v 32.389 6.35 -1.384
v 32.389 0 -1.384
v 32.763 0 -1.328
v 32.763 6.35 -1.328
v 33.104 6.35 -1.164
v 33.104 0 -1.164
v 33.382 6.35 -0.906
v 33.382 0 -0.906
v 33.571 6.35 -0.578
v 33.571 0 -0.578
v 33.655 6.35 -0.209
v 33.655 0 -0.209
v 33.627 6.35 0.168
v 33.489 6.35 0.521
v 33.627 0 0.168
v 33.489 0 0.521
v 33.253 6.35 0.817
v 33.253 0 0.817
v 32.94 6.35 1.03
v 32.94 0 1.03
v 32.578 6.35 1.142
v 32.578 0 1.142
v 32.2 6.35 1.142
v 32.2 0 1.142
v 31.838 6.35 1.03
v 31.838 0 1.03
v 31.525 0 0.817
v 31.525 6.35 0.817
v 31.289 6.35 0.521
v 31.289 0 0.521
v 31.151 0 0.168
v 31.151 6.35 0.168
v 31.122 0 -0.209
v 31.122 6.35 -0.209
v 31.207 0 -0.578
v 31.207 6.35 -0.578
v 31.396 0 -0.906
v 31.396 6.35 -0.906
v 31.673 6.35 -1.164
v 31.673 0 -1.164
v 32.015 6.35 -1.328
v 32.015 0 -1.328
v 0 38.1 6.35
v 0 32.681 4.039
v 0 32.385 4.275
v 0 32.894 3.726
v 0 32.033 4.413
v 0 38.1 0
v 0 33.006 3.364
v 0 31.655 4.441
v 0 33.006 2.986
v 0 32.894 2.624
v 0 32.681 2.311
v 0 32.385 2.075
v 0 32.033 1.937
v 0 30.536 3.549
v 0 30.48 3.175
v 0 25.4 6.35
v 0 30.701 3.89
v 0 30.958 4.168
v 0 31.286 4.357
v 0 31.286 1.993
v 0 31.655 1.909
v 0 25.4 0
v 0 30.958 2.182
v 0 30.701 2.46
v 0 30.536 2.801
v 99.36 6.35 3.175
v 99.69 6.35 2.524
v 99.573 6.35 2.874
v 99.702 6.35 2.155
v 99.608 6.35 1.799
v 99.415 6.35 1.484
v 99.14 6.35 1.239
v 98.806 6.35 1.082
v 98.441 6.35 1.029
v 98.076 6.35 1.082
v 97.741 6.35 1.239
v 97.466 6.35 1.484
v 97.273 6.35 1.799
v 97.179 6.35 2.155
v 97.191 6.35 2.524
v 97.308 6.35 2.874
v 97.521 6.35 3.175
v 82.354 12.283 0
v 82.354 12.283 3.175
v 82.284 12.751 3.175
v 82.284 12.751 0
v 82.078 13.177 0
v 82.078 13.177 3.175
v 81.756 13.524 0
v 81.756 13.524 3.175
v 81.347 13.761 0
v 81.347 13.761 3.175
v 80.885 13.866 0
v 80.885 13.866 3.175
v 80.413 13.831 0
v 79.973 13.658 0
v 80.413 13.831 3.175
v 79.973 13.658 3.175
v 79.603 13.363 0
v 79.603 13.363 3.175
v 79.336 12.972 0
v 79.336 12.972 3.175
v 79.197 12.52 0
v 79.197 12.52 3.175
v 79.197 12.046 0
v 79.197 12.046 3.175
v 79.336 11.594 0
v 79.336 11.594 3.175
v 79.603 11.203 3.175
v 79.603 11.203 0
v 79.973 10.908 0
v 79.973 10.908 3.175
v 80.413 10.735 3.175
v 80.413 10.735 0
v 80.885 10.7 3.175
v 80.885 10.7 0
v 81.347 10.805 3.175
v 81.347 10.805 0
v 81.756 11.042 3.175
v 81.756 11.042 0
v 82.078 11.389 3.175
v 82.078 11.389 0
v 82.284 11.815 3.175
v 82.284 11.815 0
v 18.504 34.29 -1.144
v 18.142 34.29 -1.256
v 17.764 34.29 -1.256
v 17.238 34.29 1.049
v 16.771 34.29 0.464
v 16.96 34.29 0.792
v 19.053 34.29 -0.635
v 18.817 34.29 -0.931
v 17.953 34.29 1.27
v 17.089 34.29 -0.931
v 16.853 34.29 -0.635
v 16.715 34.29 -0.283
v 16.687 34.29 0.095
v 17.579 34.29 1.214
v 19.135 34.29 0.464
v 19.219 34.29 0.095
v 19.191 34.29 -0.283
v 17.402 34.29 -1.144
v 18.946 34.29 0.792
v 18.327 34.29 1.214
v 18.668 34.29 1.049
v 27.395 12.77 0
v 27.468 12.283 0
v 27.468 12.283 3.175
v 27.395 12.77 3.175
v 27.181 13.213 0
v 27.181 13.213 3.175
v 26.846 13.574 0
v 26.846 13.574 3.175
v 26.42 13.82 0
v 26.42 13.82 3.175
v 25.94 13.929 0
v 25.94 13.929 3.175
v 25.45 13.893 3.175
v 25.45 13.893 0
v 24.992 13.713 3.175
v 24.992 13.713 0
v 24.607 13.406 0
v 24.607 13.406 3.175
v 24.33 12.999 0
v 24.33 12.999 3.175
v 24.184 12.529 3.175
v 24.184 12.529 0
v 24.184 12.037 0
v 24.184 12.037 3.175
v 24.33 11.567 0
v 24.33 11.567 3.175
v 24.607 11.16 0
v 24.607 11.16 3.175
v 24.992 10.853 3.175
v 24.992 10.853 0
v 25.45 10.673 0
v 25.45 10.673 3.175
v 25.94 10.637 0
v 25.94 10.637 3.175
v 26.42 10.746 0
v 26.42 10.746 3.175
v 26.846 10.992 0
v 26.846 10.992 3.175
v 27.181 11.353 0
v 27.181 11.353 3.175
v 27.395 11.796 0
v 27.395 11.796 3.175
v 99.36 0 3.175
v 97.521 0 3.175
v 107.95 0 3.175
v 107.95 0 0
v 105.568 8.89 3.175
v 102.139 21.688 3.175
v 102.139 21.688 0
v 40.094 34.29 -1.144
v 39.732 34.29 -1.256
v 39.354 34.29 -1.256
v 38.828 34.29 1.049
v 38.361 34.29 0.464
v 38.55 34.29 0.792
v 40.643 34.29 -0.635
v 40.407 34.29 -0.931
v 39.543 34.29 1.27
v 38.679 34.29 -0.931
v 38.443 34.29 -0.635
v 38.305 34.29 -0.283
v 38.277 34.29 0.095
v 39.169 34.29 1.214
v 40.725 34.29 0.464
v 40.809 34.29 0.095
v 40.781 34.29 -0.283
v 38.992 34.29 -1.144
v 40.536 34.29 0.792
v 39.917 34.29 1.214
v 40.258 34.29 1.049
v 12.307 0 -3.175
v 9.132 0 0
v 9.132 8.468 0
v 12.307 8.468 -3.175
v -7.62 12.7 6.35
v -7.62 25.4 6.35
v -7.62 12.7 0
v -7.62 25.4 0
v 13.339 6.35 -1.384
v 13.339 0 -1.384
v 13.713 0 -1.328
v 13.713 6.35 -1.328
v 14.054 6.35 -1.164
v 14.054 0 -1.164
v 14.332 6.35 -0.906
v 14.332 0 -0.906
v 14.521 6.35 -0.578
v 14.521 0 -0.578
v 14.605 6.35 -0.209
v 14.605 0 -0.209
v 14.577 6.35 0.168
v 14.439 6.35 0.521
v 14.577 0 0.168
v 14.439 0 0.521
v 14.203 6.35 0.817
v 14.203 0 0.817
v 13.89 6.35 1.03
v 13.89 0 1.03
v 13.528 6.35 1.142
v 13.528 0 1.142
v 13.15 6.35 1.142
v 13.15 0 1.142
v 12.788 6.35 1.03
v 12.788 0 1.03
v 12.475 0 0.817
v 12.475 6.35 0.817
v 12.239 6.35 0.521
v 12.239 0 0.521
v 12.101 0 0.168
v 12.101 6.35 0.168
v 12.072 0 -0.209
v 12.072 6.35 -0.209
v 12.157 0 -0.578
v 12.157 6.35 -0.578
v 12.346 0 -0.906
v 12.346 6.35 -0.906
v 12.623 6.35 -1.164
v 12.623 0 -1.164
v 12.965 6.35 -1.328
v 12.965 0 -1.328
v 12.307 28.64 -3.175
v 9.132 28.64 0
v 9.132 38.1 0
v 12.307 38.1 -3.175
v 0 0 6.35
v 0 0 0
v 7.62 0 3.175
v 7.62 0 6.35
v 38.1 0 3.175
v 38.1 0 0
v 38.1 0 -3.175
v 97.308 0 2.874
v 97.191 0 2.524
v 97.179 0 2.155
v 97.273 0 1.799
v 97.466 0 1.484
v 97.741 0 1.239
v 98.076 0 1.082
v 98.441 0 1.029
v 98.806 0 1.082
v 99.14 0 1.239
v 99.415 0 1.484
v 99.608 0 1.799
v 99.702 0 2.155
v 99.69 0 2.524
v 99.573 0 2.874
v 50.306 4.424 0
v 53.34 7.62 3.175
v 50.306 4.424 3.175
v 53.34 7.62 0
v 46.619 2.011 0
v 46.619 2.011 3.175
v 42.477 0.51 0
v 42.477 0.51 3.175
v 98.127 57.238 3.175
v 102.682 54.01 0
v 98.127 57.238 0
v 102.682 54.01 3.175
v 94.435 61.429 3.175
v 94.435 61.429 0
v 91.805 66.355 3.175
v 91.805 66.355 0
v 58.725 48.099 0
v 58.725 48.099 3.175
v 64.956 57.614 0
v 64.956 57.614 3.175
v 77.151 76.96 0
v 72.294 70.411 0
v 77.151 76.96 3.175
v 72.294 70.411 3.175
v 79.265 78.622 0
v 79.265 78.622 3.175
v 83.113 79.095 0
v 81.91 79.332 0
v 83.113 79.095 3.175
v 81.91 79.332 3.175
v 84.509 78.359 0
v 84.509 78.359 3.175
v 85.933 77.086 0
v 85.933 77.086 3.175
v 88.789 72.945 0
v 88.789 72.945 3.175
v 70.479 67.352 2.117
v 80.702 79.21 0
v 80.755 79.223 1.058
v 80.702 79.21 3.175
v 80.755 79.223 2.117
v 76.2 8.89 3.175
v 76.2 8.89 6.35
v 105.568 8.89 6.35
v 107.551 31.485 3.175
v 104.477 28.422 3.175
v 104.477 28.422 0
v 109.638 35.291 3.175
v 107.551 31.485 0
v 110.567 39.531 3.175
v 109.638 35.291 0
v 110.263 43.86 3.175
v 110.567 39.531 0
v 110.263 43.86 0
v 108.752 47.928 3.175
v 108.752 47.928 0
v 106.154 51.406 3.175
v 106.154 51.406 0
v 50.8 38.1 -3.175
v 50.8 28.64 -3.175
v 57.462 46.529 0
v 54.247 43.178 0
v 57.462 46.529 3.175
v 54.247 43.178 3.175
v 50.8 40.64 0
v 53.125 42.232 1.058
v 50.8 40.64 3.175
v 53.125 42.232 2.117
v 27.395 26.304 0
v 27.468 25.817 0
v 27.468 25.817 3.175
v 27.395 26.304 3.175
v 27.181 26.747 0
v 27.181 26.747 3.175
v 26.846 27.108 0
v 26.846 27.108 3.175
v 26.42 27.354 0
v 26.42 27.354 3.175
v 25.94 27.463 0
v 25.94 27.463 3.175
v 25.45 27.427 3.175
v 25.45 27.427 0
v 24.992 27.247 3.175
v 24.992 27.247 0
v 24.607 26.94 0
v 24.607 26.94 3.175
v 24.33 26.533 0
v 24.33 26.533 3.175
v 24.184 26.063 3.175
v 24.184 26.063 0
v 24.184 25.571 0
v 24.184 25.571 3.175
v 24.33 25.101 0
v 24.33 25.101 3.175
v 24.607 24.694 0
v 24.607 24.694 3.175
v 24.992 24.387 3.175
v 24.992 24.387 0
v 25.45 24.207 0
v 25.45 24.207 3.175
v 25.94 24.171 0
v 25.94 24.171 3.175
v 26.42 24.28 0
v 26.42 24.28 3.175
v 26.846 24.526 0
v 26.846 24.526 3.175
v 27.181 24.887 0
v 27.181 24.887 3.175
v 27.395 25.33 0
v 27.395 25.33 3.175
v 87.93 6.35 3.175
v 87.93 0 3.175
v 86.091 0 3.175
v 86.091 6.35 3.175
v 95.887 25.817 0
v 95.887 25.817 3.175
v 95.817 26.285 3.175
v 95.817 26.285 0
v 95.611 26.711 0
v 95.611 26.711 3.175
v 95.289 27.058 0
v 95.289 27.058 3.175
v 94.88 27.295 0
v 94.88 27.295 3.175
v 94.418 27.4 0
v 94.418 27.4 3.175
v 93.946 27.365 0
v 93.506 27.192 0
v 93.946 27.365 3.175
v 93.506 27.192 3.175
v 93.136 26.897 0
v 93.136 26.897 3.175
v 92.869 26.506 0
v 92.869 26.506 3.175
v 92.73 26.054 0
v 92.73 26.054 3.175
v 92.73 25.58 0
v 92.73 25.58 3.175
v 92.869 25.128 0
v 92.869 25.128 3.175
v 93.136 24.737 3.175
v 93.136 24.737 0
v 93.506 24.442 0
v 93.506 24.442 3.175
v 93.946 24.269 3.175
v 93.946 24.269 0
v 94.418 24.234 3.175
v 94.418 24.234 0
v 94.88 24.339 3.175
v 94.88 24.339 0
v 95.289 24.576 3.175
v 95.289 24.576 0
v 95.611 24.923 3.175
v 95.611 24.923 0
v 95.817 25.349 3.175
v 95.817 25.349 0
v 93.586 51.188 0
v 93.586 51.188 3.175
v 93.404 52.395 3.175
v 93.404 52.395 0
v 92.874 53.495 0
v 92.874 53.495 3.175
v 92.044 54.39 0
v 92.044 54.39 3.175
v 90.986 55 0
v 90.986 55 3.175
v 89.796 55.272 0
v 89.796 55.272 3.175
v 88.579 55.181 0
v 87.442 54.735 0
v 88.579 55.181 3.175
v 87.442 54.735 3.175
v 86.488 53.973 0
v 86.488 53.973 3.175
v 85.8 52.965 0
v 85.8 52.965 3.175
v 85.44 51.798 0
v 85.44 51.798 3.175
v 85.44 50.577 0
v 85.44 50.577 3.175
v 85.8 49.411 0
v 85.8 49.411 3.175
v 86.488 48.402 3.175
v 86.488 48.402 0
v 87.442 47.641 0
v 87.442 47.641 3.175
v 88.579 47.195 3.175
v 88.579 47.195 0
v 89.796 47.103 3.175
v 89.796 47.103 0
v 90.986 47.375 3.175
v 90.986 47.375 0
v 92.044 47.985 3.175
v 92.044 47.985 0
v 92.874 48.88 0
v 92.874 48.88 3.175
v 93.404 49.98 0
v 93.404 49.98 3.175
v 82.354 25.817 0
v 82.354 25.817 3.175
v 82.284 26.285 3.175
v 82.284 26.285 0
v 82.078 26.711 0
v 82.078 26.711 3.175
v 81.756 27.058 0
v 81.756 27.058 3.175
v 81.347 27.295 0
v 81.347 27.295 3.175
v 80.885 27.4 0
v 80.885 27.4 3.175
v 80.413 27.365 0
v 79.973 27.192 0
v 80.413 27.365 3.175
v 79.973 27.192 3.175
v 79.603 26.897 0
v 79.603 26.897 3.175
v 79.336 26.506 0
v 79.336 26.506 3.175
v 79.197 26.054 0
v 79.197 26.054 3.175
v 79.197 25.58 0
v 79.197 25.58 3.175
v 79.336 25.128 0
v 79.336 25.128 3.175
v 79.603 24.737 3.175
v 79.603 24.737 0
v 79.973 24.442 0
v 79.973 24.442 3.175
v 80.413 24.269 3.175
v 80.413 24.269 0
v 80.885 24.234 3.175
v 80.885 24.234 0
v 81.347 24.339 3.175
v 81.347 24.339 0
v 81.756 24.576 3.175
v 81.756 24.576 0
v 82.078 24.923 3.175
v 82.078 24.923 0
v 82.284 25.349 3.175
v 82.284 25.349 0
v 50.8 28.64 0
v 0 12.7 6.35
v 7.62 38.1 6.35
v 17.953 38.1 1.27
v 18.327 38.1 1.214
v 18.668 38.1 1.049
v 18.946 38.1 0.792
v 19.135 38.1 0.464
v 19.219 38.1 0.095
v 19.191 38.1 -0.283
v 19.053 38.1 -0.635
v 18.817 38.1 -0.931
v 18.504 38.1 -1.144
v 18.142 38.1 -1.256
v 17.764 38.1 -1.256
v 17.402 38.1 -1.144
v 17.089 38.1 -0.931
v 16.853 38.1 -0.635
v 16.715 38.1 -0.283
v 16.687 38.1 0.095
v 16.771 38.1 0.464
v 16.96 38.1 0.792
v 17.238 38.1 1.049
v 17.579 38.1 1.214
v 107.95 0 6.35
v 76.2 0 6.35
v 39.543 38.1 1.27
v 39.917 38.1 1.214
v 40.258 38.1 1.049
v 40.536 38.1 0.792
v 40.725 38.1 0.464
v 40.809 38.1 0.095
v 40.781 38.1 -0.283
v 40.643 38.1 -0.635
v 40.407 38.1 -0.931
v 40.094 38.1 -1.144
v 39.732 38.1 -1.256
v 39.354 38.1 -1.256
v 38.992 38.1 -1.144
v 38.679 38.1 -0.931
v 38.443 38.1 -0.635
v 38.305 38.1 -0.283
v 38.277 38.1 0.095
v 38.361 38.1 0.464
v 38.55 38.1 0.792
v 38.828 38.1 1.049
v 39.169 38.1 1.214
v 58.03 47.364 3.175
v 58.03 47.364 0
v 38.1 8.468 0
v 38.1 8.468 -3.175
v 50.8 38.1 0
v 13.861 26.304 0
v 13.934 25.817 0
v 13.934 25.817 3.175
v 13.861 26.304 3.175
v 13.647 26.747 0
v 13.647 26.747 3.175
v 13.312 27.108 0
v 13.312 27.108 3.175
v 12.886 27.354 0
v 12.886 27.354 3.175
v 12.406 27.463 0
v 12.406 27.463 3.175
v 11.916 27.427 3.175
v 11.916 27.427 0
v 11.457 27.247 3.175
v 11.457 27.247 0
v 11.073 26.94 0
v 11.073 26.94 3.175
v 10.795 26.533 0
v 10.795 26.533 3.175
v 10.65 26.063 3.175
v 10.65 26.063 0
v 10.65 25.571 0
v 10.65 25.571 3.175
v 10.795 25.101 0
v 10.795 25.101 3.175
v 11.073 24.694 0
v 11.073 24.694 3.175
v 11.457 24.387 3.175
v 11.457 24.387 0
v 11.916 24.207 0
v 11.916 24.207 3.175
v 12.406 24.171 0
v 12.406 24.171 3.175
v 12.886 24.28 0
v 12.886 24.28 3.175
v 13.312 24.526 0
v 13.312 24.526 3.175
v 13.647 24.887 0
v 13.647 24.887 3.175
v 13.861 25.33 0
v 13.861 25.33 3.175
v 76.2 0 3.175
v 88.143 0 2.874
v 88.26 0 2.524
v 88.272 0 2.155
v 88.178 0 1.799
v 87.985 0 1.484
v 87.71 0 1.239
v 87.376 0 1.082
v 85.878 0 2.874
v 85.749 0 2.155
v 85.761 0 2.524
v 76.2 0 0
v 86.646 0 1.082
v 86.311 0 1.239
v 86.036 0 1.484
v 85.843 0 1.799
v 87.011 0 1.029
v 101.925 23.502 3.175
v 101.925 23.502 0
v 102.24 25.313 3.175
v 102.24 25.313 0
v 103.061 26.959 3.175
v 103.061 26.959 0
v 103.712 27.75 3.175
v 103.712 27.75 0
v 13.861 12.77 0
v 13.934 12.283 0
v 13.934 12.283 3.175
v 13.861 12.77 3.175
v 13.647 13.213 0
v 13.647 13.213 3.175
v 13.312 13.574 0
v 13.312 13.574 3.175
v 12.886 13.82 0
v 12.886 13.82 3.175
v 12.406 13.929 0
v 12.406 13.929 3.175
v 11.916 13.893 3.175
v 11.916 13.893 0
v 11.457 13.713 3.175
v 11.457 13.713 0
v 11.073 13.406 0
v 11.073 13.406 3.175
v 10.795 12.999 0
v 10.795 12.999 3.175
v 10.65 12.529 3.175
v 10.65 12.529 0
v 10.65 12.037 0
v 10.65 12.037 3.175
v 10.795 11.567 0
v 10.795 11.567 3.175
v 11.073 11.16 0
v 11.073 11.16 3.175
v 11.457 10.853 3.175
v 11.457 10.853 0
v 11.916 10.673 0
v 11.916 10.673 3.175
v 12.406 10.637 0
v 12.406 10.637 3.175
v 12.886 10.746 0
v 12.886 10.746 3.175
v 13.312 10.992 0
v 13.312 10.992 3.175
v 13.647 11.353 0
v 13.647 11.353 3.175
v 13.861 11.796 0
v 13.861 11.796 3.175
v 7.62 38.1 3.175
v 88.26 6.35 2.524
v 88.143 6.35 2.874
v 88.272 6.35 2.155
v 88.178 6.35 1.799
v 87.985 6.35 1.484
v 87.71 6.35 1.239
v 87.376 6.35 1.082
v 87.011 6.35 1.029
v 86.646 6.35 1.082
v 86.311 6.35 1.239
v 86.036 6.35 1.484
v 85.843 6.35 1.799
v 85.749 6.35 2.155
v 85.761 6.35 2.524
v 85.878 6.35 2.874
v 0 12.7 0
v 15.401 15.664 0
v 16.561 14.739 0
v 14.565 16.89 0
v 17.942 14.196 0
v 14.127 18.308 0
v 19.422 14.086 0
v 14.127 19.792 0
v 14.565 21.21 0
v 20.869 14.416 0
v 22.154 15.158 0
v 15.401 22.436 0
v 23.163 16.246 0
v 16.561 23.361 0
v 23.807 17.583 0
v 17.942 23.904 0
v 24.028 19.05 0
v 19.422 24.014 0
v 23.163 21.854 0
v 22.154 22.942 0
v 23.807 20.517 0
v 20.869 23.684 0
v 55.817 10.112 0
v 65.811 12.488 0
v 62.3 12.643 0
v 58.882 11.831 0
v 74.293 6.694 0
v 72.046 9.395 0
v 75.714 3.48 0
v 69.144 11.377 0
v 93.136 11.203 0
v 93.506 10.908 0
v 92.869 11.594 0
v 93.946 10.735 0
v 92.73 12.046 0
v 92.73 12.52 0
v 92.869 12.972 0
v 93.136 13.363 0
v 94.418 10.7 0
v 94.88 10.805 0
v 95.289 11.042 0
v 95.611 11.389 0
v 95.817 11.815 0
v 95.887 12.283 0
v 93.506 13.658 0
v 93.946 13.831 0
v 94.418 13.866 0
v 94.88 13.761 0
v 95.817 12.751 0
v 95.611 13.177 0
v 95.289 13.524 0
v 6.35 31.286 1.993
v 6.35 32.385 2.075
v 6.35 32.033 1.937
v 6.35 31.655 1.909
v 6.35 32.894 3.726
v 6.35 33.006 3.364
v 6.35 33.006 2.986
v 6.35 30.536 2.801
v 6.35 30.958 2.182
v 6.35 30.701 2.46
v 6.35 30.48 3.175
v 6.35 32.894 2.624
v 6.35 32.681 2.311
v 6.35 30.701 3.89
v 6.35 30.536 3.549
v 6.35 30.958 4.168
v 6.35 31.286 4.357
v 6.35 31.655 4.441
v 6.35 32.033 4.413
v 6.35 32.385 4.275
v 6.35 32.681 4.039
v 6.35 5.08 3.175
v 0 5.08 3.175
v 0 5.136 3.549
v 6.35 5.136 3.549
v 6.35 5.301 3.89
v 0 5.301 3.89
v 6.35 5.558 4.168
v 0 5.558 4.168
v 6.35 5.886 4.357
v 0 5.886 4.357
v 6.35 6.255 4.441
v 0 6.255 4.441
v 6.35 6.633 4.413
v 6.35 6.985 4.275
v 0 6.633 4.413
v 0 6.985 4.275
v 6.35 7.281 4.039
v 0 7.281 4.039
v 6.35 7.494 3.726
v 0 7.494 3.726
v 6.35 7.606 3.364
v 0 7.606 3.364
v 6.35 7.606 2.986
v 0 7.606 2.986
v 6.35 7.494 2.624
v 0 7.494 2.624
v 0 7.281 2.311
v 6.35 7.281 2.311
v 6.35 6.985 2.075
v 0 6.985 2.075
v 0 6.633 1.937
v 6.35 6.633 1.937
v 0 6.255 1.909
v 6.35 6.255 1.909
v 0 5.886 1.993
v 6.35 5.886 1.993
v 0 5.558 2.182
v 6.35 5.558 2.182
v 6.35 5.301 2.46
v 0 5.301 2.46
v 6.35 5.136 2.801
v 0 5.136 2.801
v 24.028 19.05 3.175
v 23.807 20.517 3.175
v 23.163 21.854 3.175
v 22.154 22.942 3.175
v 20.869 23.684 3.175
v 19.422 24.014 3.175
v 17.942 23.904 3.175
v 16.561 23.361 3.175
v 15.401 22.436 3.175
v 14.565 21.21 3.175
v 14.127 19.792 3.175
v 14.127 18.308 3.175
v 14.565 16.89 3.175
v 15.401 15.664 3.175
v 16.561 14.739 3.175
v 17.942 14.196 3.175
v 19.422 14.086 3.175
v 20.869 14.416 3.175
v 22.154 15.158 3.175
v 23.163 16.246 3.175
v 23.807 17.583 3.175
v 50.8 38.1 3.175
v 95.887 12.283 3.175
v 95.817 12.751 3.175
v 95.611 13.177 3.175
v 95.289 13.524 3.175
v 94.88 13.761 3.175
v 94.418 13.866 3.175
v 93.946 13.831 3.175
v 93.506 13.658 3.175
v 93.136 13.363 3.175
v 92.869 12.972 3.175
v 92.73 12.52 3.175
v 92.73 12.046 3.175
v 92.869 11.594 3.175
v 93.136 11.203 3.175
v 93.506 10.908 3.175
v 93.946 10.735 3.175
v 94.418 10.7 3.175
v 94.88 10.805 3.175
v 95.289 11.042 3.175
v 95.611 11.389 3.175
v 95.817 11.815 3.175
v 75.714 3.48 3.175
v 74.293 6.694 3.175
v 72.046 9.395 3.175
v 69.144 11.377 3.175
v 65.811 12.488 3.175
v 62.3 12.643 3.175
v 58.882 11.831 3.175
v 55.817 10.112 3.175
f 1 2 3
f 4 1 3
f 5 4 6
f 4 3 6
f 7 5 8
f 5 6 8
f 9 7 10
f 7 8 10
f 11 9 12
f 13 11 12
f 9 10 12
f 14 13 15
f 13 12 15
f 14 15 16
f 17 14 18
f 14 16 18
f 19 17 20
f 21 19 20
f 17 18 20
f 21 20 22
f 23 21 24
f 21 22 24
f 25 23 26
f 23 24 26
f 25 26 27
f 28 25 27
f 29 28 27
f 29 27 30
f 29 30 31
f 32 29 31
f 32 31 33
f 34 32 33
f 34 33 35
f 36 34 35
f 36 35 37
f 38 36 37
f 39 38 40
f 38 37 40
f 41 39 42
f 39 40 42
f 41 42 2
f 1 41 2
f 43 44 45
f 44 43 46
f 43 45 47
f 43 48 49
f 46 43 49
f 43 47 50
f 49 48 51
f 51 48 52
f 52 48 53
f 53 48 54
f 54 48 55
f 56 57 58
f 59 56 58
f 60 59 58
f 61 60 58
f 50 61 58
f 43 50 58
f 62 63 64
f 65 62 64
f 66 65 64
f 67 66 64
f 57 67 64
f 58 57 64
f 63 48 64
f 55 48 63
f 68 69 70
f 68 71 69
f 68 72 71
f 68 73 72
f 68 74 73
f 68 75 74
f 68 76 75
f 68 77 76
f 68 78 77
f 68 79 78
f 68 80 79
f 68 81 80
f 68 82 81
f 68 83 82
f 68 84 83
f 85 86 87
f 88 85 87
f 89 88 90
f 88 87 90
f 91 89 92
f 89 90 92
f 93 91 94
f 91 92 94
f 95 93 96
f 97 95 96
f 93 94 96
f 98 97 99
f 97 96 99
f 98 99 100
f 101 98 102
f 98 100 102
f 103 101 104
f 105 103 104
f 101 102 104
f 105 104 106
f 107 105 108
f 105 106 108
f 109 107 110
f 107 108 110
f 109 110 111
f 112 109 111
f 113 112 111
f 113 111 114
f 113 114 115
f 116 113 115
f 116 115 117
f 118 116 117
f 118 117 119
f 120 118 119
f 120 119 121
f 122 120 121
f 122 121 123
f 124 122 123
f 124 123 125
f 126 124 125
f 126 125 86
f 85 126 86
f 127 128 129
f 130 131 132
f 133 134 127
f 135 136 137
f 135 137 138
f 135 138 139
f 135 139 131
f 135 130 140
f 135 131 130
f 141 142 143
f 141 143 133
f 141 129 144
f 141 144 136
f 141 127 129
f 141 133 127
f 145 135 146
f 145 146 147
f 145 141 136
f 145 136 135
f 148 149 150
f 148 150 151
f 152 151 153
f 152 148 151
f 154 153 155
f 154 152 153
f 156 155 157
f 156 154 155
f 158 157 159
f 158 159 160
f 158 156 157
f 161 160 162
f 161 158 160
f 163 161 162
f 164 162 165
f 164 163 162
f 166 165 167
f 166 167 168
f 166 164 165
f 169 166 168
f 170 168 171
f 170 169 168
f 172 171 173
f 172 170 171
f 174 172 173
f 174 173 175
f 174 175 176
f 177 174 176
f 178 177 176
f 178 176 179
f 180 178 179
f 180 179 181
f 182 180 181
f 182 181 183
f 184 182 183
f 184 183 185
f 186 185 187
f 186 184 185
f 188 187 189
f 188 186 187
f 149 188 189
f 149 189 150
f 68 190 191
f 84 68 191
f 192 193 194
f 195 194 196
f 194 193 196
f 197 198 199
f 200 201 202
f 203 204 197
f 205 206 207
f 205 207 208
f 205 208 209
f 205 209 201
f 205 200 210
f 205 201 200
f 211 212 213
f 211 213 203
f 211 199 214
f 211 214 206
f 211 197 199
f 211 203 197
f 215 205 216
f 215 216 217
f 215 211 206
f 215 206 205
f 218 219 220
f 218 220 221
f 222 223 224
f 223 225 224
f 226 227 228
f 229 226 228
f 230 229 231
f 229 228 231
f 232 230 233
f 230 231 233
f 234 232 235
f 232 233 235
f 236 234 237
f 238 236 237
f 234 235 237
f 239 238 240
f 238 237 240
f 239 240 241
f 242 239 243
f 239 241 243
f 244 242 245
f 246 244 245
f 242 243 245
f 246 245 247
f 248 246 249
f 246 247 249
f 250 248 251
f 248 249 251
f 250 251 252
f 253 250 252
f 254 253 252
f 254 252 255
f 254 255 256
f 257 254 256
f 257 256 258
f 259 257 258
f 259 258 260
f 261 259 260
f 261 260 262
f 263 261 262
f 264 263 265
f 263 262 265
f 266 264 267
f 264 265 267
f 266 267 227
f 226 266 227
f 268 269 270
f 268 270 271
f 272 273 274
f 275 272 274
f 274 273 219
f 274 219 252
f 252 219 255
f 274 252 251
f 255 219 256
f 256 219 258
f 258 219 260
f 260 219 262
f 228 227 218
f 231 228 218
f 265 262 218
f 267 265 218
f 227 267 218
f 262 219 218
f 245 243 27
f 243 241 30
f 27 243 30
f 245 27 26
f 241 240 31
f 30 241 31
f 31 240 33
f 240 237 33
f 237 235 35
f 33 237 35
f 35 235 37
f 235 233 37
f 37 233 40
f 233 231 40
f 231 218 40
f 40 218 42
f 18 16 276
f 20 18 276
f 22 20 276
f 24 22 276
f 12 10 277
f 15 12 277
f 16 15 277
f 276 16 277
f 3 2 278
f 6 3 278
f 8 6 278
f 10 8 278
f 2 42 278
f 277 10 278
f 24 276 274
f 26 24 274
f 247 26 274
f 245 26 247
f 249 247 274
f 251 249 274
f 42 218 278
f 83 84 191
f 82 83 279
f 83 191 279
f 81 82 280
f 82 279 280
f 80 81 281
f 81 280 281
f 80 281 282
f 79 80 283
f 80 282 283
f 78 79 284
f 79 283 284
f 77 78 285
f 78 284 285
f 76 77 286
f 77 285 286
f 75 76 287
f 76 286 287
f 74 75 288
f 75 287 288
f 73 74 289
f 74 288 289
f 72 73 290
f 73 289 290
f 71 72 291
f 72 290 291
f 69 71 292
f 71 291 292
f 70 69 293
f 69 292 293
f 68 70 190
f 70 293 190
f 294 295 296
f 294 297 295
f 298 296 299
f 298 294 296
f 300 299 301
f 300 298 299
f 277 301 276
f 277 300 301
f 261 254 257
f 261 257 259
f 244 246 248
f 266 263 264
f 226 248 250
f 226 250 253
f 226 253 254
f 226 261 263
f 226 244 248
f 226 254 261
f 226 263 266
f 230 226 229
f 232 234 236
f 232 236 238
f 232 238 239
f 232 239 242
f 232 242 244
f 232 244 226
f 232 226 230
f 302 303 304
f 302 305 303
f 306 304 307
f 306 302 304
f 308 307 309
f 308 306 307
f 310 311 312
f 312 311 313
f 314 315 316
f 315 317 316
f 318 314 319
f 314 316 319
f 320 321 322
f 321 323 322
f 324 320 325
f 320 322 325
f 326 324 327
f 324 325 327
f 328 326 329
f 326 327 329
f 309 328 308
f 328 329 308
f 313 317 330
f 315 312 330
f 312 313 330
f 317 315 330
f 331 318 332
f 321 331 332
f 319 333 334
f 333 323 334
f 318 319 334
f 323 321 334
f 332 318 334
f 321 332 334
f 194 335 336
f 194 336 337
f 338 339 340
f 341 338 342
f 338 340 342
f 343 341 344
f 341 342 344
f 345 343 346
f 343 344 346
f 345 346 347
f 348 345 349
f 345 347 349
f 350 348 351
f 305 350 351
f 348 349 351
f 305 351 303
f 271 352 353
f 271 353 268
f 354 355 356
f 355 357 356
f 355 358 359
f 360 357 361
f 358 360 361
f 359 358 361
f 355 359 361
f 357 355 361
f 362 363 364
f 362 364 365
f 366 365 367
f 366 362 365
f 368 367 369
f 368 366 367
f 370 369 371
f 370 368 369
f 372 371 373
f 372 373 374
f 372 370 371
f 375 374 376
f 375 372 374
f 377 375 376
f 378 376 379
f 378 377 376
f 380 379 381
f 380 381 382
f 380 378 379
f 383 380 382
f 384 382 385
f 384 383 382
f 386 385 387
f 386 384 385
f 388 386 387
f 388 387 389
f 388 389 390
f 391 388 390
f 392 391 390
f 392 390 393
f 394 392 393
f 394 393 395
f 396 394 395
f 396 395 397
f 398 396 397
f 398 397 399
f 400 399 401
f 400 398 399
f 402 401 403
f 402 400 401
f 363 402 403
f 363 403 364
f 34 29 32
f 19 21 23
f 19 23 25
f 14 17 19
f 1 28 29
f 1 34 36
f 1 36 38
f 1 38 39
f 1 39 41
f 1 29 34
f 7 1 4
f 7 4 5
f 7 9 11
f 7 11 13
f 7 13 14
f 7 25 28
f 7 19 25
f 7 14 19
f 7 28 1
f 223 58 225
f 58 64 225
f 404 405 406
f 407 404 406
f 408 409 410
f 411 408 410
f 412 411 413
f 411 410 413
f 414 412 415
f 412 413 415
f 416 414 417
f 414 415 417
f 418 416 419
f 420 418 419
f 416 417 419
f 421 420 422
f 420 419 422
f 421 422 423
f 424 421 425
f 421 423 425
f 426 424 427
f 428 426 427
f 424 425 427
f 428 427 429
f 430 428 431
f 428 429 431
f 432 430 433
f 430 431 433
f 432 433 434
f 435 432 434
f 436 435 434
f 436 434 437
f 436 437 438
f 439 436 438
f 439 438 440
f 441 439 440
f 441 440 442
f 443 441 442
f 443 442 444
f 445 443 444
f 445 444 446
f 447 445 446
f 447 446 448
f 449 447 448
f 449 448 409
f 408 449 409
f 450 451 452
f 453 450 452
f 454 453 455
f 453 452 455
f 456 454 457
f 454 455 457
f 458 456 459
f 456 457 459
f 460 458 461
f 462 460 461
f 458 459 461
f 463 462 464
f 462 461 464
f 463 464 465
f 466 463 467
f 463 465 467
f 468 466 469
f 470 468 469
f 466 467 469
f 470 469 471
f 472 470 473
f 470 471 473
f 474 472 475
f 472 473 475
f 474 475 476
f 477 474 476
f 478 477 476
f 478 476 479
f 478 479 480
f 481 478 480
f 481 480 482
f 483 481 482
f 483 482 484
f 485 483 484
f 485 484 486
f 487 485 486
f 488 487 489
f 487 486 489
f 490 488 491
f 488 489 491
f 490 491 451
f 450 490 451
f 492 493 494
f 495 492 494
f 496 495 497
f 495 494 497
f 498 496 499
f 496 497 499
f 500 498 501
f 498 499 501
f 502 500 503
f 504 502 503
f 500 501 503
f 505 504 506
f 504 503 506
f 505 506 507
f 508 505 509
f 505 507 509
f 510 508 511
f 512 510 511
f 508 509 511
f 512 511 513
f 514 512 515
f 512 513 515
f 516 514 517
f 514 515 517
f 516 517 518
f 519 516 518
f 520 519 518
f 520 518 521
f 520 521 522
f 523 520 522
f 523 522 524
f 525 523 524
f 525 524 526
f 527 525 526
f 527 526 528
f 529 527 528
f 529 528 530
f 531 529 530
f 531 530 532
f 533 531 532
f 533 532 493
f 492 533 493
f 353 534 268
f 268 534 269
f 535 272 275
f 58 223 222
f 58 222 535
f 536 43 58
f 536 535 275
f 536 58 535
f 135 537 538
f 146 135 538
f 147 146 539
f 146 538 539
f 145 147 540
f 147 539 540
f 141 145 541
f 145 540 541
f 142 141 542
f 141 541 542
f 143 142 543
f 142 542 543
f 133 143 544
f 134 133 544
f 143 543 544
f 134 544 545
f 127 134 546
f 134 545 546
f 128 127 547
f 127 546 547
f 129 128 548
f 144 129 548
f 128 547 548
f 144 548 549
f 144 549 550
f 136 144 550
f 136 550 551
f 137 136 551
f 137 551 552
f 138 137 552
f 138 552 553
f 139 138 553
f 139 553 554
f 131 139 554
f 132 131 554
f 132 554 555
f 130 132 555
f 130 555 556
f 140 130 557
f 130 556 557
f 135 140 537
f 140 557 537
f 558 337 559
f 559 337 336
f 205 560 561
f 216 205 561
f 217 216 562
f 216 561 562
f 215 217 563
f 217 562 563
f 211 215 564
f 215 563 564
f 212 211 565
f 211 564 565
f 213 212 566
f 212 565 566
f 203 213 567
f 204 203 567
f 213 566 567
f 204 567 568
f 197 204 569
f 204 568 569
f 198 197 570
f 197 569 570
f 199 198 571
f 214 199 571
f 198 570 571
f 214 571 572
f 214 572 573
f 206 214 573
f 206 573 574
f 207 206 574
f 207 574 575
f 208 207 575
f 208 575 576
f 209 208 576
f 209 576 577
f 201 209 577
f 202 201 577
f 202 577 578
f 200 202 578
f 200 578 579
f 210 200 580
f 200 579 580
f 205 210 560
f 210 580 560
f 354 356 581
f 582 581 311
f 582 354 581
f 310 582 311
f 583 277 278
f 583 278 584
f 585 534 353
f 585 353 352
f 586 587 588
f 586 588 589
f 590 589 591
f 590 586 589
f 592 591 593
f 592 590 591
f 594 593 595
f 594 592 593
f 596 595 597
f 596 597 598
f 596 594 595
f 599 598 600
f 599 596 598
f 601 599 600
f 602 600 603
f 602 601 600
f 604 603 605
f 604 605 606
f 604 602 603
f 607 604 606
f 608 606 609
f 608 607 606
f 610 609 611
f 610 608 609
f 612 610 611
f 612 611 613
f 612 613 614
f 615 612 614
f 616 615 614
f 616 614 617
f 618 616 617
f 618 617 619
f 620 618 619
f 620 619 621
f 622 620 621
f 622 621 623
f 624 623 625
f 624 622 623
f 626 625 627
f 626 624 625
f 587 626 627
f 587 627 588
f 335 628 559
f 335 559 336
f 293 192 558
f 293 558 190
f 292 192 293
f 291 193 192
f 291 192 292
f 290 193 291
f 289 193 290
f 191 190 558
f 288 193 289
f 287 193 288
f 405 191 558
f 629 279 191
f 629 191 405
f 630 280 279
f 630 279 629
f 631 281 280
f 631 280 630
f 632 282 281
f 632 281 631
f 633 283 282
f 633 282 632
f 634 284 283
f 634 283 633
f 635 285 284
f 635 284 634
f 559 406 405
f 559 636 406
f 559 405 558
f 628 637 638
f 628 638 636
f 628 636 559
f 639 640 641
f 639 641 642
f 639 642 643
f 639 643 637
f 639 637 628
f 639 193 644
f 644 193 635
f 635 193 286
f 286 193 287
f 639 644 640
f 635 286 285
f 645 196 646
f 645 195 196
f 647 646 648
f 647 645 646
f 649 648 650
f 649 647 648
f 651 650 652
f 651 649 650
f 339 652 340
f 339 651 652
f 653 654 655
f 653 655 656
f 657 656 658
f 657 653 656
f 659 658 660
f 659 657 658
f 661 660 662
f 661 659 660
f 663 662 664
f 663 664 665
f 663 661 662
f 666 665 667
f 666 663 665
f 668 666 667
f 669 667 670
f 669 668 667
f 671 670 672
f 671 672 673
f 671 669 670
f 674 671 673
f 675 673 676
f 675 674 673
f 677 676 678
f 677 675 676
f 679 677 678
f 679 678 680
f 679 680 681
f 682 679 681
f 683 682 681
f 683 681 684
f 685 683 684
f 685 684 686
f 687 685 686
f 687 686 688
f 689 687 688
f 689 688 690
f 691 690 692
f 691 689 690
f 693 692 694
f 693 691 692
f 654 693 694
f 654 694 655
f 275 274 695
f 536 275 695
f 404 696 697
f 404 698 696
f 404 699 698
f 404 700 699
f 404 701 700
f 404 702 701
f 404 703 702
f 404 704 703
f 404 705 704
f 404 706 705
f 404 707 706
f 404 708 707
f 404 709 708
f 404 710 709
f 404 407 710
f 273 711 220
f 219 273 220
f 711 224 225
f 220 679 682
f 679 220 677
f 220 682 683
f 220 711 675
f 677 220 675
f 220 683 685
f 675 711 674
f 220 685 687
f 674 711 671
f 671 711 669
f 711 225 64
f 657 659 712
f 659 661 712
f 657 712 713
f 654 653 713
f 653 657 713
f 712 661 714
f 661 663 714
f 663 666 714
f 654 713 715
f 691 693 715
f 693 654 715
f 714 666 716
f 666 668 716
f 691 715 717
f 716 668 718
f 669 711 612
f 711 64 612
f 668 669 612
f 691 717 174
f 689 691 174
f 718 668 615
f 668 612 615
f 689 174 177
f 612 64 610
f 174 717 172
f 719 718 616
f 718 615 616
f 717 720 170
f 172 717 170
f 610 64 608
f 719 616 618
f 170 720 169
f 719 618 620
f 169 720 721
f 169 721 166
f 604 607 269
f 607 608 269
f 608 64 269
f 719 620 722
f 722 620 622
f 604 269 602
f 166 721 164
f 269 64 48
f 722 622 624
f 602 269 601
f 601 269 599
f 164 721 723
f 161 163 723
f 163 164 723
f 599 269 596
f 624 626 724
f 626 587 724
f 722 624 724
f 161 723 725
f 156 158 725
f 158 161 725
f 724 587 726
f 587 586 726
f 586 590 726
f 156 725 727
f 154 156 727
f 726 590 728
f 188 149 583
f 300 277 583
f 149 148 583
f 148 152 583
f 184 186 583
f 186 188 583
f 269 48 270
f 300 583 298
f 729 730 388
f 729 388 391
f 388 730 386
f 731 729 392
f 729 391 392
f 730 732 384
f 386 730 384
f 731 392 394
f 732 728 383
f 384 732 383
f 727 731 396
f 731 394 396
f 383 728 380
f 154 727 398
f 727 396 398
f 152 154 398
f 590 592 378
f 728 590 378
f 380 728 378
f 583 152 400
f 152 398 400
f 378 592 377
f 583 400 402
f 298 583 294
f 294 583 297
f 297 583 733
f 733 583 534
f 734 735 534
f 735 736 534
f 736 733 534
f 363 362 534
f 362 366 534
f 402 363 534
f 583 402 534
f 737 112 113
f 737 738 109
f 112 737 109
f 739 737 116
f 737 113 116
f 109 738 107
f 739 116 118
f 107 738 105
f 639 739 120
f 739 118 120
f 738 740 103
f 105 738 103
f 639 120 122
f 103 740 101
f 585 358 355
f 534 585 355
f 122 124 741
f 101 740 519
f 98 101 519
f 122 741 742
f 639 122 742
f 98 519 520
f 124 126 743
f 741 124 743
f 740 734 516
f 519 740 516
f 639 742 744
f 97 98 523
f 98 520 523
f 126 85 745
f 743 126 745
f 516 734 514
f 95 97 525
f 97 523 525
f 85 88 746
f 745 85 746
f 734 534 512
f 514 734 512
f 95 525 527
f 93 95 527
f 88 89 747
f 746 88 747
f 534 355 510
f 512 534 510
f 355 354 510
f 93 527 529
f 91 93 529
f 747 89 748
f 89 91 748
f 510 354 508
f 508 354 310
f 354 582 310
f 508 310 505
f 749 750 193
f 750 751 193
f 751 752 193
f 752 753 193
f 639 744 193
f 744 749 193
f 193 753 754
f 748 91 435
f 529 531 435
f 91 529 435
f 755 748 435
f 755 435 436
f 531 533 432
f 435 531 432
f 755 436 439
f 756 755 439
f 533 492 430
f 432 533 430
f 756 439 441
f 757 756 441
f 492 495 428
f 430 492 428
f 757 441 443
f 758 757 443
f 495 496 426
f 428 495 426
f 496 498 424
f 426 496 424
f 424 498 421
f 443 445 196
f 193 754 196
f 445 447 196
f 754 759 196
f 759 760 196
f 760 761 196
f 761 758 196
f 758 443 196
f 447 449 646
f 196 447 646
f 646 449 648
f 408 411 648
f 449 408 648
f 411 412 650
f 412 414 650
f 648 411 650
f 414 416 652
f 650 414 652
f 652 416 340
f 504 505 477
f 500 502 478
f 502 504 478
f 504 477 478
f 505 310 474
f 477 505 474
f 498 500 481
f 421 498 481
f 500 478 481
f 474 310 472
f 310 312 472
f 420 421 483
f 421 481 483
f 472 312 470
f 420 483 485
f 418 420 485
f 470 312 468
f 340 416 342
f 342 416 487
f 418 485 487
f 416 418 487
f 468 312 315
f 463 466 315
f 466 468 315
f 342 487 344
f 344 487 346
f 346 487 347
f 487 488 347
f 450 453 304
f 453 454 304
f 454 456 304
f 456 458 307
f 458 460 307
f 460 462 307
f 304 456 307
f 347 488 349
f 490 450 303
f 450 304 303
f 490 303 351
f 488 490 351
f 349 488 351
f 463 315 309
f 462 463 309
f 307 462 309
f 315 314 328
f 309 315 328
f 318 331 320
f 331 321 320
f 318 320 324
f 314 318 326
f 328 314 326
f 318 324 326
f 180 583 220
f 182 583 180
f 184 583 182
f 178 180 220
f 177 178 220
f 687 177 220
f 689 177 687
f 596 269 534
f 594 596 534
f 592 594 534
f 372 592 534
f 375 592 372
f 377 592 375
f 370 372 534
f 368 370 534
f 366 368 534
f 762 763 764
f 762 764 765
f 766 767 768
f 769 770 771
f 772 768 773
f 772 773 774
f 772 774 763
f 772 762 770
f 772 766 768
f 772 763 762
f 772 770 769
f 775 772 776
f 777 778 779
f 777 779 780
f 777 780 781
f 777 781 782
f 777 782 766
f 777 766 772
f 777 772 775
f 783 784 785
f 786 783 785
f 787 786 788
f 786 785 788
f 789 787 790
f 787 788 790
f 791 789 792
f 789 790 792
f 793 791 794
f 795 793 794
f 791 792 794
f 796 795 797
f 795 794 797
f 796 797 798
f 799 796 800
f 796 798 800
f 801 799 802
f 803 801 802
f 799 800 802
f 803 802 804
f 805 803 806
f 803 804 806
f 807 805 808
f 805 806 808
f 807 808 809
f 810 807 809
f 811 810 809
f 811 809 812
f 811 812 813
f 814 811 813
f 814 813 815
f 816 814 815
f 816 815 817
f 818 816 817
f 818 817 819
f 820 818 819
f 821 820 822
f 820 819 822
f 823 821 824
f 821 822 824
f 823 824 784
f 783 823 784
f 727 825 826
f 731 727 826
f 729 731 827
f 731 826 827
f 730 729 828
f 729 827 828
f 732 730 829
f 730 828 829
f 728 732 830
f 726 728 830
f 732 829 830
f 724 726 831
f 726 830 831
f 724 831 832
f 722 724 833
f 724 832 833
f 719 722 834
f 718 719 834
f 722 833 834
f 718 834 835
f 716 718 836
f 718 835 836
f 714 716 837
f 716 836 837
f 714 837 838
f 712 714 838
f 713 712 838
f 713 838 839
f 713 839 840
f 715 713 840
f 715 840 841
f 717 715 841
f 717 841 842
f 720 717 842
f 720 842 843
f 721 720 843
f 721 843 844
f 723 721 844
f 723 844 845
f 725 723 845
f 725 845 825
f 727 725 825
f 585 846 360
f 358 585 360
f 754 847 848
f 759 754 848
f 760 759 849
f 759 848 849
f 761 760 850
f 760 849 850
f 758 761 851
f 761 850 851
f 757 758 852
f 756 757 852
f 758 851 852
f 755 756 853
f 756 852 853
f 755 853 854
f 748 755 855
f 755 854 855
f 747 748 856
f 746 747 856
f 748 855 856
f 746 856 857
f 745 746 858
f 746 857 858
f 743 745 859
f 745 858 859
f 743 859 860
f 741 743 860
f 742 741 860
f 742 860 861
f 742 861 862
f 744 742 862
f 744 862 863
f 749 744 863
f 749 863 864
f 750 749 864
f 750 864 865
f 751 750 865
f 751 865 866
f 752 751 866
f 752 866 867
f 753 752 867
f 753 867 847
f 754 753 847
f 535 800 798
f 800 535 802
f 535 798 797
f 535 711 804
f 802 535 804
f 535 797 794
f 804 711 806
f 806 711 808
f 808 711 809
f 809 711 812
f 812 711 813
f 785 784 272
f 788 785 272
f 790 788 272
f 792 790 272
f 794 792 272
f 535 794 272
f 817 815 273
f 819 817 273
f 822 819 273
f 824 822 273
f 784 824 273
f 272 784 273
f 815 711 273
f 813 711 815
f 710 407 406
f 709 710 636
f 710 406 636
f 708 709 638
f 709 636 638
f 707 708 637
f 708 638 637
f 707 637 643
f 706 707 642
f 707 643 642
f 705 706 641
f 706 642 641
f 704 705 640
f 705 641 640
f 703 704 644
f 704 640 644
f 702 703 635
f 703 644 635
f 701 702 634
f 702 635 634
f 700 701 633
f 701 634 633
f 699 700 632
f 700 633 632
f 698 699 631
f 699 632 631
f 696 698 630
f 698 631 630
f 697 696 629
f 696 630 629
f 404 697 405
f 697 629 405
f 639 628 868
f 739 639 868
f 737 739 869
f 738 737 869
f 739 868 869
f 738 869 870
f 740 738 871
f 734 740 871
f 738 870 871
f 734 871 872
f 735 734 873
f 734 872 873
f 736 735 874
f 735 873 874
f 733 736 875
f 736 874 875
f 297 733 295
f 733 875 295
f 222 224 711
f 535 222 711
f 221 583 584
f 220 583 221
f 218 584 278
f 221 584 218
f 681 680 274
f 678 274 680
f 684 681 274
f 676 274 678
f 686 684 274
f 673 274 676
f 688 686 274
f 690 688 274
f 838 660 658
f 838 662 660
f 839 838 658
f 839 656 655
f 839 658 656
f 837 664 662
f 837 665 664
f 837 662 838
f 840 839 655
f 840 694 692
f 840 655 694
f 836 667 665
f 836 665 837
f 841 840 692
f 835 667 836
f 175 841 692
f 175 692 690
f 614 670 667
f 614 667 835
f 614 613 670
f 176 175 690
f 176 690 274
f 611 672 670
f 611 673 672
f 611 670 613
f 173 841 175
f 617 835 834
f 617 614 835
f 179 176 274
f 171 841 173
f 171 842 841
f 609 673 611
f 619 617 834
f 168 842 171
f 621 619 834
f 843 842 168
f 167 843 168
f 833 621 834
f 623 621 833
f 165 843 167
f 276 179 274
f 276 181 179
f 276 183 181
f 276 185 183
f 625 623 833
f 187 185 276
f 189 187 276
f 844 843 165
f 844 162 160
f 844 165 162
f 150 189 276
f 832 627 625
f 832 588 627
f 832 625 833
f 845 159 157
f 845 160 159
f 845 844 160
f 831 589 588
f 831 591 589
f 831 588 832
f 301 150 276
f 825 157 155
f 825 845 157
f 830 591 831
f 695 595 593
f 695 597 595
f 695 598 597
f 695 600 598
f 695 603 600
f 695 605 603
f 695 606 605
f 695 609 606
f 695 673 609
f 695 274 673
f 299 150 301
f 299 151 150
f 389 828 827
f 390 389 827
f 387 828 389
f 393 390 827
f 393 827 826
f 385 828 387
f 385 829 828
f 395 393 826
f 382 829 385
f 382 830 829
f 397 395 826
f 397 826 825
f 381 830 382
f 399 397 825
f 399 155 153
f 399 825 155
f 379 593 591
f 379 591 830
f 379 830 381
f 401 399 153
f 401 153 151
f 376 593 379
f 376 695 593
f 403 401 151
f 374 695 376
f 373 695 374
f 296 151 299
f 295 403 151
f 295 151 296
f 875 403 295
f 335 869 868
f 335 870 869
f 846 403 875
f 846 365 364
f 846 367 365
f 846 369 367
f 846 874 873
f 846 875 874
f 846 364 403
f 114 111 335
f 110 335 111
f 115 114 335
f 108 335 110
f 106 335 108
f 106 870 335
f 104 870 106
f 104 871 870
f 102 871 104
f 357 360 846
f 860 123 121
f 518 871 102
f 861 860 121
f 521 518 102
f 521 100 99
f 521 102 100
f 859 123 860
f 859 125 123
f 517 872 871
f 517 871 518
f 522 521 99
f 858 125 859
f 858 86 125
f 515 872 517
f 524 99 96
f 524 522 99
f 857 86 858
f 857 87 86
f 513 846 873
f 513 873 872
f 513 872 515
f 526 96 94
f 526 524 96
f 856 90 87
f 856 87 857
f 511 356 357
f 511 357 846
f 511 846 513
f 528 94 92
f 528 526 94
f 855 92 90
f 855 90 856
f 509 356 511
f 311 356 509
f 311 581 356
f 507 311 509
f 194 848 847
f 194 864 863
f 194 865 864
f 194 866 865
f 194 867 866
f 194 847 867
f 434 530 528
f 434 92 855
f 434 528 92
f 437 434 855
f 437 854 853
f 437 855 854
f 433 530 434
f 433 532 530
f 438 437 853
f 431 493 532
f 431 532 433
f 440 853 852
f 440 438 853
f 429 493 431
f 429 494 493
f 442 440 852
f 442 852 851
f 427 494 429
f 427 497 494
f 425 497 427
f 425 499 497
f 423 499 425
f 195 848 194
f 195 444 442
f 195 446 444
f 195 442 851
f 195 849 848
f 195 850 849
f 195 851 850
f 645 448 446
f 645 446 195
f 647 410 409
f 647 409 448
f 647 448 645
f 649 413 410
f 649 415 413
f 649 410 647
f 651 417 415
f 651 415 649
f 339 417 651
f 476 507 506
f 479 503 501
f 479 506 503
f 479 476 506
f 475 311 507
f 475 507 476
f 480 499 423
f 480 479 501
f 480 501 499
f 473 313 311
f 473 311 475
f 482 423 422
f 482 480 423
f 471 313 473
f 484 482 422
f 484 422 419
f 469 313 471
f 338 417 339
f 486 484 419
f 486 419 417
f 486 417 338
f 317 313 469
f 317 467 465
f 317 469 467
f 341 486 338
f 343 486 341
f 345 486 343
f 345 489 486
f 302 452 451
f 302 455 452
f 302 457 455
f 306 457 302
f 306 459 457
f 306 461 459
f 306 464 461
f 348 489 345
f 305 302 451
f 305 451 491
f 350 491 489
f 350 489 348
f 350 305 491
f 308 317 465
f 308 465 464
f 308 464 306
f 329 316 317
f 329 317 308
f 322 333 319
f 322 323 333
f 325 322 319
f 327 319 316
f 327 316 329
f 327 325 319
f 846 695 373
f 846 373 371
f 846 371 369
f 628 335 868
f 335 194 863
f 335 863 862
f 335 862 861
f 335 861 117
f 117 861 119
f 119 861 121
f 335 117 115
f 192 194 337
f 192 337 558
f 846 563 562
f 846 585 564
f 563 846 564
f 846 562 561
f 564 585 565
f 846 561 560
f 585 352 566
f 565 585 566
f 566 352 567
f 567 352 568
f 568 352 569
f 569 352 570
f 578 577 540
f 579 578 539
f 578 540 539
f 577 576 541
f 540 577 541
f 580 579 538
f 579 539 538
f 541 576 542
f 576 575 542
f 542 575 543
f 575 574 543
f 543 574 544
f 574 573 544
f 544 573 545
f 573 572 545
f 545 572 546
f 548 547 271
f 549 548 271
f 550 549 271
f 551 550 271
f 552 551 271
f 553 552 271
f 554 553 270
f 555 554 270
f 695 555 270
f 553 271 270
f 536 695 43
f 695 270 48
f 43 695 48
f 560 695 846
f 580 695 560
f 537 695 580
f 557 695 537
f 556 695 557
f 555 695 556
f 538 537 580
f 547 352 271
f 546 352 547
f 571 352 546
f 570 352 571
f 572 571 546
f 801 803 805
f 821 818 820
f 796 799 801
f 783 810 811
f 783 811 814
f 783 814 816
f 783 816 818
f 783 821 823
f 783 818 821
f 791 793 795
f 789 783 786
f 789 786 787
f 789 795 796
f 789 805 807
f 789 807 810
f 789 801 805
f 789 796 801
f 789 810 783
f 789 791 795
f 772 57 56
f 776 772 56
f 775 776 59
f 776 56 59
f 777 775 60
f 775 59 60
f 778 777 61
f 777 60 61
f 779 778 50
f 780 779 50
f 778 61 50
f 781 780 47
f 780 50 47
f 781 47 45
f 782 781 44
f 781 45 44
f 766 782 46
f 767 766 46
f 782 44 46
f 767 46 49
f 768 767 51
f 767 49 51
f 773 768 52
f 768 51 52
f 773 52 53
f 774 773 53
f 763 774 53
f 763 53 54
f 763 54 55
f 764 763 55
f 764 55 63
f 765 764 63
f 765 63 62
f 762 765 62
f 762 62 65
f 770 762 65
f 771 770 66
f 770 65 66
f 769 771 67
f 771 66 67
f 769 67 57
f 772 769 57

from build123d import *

# Parameters (mm, degrees)
SKETCH1_R           = 1.651
BOSS_EXTRUDE1_DEPTH = 3.175
CUT_EXTRUDE2_DEPTH  = 6.35
SKETCH7_R           = 4.9784
SKETCH7_R_2         = 1.5875
CUT_EXTRUDE3_DEPTH  = 124.96234811
FILLET1_R           = 6.35
SKETCH8_W           = 50.8
SKETCH8_H           = 12.7
CUT_EXTRUDE4_DEPTH  = 50.8
CUT_EXTRUDE5_DEPTH  = 19.304
FILLET6_R           = 6.35
FILLET7_R           = 6.35
FILLET8_R           = 19.05
BOSS_EXTRUDE2_DEPTH = 3.175
FILLET9_R           = 24.13
SKETCH13_W          = 41.667851519
SKETCH13_H          = 9.459584315
SKETCH13_W_2        = 28.967851519
SKETCH13_H_2        = 8.468235606
BOSS_EXTRUDE3_DEPTH = 3.175
BOSS_EXTRUDE4_DEPTH = 3.175
CUT_EXTRUDE9_DEPTH  = 119.214793194
SKETCH20_R          = 1.27
CUT_EXTRUDE10_DEPTH = 3.81
SKETCH21_R          = 1.27
CUT_EXTRUDE11_DEPTH = 6.35
SKETCH22_R          = 1.27
CUT_EXTRUDE12_DEPTH = 6.35
BOSS_EXTRUDE5_DEPTH = 3.175
SKETCH24_R          = 4.09575
CUT_EXTRUDE13_DEPTH = 3.175


with BuildPart() as part:
    # Sketch1 → Boss-Extrude1 (new body)
    with BuildSketch(Plane.XY):
        with BuildLine():
            Line((0, 0), (107.95, 0))
            Line((107.95, 0), (100.9362606, 26.175631792))
            Line((100.9362606, 26.175631792), (100.868755024, 26.427566033))
            ThreePointArc((100.868755024, 26.427566033), (110.348359368, 43.438223217), (95.367453293, 55.88))
            Line((95.367453293, 55.88), (0, 38.1))
            Line((0, 38.1), (0, 25.4))
            Line((0, 25.4), (-7.62, 25.4))
            Line((-7.62, 25.4), (-7.62, 12.7))
            Line((-7.62, 12.7), (0, 12.7))
            Line((0, 12.7), (0, 0))
        make_face()
        with Locations((25.817011896, 25.817011896)):
            Circle(SKETCH1_R, mode=Mode.SUBTRACT)
        with Locations((25.817011896, 12.282988104)):
            Circle(SKETCH1_R, mode=Mode.SUBTRACT)
        with Locations((12.282988104, 12.282988104)):
            Circle(SKETCH1_R, mode=Mode.SUBTRACT)
        with Locations((12.282988104, 25.817011896)):
            Circle(SKETCH1_R, mode=Mode.SUBTRACT)
    extrude(amount=BOSS_EXTRUDE1_DEPTH)

    # Sketch6 → Cut-Extrude2 (cut)
    with BuildSketch(Plane.XY.offset(3.175)):
        with BuildLine():
            Line((50.8, 0), (76.2, 0))
            ThreePointArc((76.2, 0), (63.5, 12.7), (50.8, 0))
        make_face()
    extrude(amount=-CUT_EXTRUDE2_DEPTH, mode=Mode.SUBTRACT)

    # Sketch7 → Cut-Extrude3 (cut, through all)
    with BuildSketch(Plane.XY.offset(3.175)):
        with Locations((19.05, 19.05)):
            Circle(SKETCH7_R)
        with Locations((80.766582748, 12.282988104)):
            Circle(SKETCH7_R_2)
        with Locations((94.299702748, 12.282988104)):
            Circle(SKETCH7_R_2)
        with Locations((80.766582748, 25.817011896)):
            Circle(SKETCH7_R_2)
        with Locations((94.299702748, 25.817011896)):
            Circle(SKETCH7_R_2)
    extrude(amount=-CUT_EXTRUDE3_DEPTH, mode=Mode.SUBTRACT)

    # Fillet1
    fillet1_edges = [part.edges().sort_by_distance(p)[0] for p in [
        (100.868755024, 26.427566033, 1.5875),
    ]]
    fillet(fillet1_edges, radius=FILLET1_R)

    # Sketch8 → Cut-Extrude4 (cut)
    with BuildSketch(Plane.XY.offset(3.175)):
        with Locations((25.4, 44.45)):
            Rectangle(SKETCH8_W, SKETCH8_H)
    extrude(amount=-CUT_EXTRUDE4_DEPTH, mode=Mode.SUBTRACT)

    # Sketch9 → Cut-Extrude5 (cut)
    with BuildSketch(Plane.XY.offset(3.175)):
        Polygon((50.8, 47.57098794), (50.8, 40.64), (57.15, 40.64), (57.15, 48.754861432), align=None)
    extrude(amount=-CUT_EXTRUDE5_DEPTH, mode=Mode.SUBTRACT)

    # Fillet6
    fillet6_edges = [part.edges().sort_by_distance(p)[0] for p in [
        (57.15, 40.64, 1.5875),
    ]]
    fillet(fillet6_edges, radius=FILLET6_R - 0.0001)  # a hair under: the kernel refuses the full size

    # Fillet7
    fillet7_edges = [part.edges().sort_by_distance(p)[0] for p in [
        (57.15, 48.754861432, 1.5875),
    ]]
    fillet(fillet7_edges, radius=FILLET7_R)

    # Fillet8
    fillet8_edges = [part.edges().sort_by_distance(p)[0] for p in [
        (50.8, 0, 1.5875),
    ]]
    fillet(fillet8_edges, radius=FILLET8_R)

    # Sketch12 → Boss-Extrude2 (add)
    with BuildSketch(Plane.XY.offset(3.175)):
        with BuildLine():
            Line((50.8, 40.64), (85.027112904, 40.64))
            Line((85.027112904, 40.64), (95.367453293, 55.88))
            add(Edge.make_bspline(
                [(50.8, 40.64), (70.777788932, 52.178803671), (78.594281742, 111.543427795), (95.367453293, 55.88)],
                knots=[0, 0, 0, 0, 1, 1, 1, 1], degree=3))
        make_face()
    extrude(amount=-BOSS_EXTRUDE2_DEPTH)

    # Fillet9
    fillet9_edges = [part.edges().sort_by_distance(p)[0] for p in [
        (95.367453293, 55.88, 1.5875),
    ]]
    fillet(fillet9_edges, radius=FILLET9_R)

    # Sketch13 → Boss-Extrude3 (add)
    with BuildSketch(Plane(origin=(0, 0, 0), x_dir=(-1, 0, 0), z_dir=(0, 0, -1))):
        with Locations((-29.966074241, 33.370207843)):
            Rectangle(SKETCH13_W, SKETCH13_H)
        with Locations((-23.616074241, 4.234117803)):
            Rectangle(SKETCH13_W_2, SKETCH13_H_2)
    extrude(amount=BOSS_EXTRUDE3_DEPTH)

    # Sketch18 → Boss-Extrude4 (add)
    with BuildSketch(Plane.XY.offset(3.175)):
        Polygon((0, 0), (7.62, 0), (7.62, 38.1), (0, 38.1), (0, 25.4), (-7.62, 25.4), (-7.62, 12.7), (0, 12.7), align=None)
    extrude(amount=BOSS_EXTRUDE4_DEPTH)

    # Sketch19 → Cut-Extrude9 (cut, through all)
    with BuildSketch(Plane(origin=(0, 38.1, 0), x_dir=(1, 0, 0), z_dir=(0, 1, 0))):
        Polygon((9.132148481, 0), (12.307148481, 3.175), (9.132148481, 3.175), align=None)
    extrude(amount=-CUT_EXTRUDE9_DEPTH, mode=Mode.SUBTRACT)

    # Sketch20 → Cut-Extrude10 (cut)
    with BuildSketch(Plane(origin=(18.309536053, 38.1, -53.667404751), x_dir=(0.9999106684671757, 0, -0.013366191885729645), z_dir=(0, 1, 0))):
        with Locations(Location((-1.073815344, -53.657845266, 0), (0, 0, 269.234150812))):
            Circle(SKETCH20_R)
        with Locations(Location((20.514255988, -53.946421349, 0), (0, 0, 269.234150812))):
            Circle(SKETCH20_R)
    extrude(amount=-CUT_EXTRUDE10_DEPTH, mode=Mode.SUBTRACT)

    # Sketch21 → Cut-Extrude11 (cut)
    with BuildSketch(Plane(origin=(0, -69.83828079, -53.667404751), x_dir=(0, 0.0318826428364363, 0.9994916193174229), z_dir=(-1, 0, 0))):
        with Locations(Location((59.242590915, 74.337262051, 0), (0, 0, 268.172949503))):
            Circle(SKETCH21_R)
        with Locations(Location((60.052410043, 99.724349182, 0), (0, 0, 268.172949503))):
            Circle(SKETCH21_R)
    extrude(amount=-CUT_EXTRUDE11_DEPTH, mode=Mode.SUBTRACT)

    # Sketch22 → Cut-Extrude12 (cut)
    with BuildSketch(Plane(origin=(18.309536053, 0, -53.667404751), x_dir=(0.9999106684671757, 0, -0.013366191885729645), z_dir=(0, -1, 0))):
        with Locations(Location((-5.686004931, 53.481882136, 0), (0, 0, 270.765849188))):
            Circle(SKETCH22_R)
        with Locations(Location((13.362293303, 53.736508092, 0), (0, 0, 270.765849188))):
            Circle(SKETCH22_R)
        with Locations((67.946889168, 56.879377031)):
            Circle(SKETCH22_R)
        with Locations((79.375868109, 57.032152605)):
            Circle(SKETCH22_R)
    extrude(amount=-CUT_EXTRUDE12_DEPTH, mode=Mode.SUBTRACT)

    # Sketch23 → Boss-Extrude5 (add)
    with BuildSketch(Plane.XY.offset(3.175)):
        Polygon((76.2, 0), (76.2, 8.89), (105.567931679, 8.89), (107.95, 0), align=None)
    extrude(amount=BOSS_EXTRUDE5_DEPTH)

    # Sketch24 → Cut-Extrude13 (cut)
    with BuildSketch(Plane(origin=(18.309536053, -69.83828079, 3.175), x_dir=(0.9998147472374107, 0.019247628596600598, 0), z_dir=(0, 0, 1))):
        with Locations(Location((73.496743516, 119.633445733, 0), (0, 0, 358.897124011))):
            Circle(SKETCH24_R)
    extrude(amount=-CUT_EXTRUDE13_DEPTH, mode=Mode.SUBTRACT)


solid = part.part
